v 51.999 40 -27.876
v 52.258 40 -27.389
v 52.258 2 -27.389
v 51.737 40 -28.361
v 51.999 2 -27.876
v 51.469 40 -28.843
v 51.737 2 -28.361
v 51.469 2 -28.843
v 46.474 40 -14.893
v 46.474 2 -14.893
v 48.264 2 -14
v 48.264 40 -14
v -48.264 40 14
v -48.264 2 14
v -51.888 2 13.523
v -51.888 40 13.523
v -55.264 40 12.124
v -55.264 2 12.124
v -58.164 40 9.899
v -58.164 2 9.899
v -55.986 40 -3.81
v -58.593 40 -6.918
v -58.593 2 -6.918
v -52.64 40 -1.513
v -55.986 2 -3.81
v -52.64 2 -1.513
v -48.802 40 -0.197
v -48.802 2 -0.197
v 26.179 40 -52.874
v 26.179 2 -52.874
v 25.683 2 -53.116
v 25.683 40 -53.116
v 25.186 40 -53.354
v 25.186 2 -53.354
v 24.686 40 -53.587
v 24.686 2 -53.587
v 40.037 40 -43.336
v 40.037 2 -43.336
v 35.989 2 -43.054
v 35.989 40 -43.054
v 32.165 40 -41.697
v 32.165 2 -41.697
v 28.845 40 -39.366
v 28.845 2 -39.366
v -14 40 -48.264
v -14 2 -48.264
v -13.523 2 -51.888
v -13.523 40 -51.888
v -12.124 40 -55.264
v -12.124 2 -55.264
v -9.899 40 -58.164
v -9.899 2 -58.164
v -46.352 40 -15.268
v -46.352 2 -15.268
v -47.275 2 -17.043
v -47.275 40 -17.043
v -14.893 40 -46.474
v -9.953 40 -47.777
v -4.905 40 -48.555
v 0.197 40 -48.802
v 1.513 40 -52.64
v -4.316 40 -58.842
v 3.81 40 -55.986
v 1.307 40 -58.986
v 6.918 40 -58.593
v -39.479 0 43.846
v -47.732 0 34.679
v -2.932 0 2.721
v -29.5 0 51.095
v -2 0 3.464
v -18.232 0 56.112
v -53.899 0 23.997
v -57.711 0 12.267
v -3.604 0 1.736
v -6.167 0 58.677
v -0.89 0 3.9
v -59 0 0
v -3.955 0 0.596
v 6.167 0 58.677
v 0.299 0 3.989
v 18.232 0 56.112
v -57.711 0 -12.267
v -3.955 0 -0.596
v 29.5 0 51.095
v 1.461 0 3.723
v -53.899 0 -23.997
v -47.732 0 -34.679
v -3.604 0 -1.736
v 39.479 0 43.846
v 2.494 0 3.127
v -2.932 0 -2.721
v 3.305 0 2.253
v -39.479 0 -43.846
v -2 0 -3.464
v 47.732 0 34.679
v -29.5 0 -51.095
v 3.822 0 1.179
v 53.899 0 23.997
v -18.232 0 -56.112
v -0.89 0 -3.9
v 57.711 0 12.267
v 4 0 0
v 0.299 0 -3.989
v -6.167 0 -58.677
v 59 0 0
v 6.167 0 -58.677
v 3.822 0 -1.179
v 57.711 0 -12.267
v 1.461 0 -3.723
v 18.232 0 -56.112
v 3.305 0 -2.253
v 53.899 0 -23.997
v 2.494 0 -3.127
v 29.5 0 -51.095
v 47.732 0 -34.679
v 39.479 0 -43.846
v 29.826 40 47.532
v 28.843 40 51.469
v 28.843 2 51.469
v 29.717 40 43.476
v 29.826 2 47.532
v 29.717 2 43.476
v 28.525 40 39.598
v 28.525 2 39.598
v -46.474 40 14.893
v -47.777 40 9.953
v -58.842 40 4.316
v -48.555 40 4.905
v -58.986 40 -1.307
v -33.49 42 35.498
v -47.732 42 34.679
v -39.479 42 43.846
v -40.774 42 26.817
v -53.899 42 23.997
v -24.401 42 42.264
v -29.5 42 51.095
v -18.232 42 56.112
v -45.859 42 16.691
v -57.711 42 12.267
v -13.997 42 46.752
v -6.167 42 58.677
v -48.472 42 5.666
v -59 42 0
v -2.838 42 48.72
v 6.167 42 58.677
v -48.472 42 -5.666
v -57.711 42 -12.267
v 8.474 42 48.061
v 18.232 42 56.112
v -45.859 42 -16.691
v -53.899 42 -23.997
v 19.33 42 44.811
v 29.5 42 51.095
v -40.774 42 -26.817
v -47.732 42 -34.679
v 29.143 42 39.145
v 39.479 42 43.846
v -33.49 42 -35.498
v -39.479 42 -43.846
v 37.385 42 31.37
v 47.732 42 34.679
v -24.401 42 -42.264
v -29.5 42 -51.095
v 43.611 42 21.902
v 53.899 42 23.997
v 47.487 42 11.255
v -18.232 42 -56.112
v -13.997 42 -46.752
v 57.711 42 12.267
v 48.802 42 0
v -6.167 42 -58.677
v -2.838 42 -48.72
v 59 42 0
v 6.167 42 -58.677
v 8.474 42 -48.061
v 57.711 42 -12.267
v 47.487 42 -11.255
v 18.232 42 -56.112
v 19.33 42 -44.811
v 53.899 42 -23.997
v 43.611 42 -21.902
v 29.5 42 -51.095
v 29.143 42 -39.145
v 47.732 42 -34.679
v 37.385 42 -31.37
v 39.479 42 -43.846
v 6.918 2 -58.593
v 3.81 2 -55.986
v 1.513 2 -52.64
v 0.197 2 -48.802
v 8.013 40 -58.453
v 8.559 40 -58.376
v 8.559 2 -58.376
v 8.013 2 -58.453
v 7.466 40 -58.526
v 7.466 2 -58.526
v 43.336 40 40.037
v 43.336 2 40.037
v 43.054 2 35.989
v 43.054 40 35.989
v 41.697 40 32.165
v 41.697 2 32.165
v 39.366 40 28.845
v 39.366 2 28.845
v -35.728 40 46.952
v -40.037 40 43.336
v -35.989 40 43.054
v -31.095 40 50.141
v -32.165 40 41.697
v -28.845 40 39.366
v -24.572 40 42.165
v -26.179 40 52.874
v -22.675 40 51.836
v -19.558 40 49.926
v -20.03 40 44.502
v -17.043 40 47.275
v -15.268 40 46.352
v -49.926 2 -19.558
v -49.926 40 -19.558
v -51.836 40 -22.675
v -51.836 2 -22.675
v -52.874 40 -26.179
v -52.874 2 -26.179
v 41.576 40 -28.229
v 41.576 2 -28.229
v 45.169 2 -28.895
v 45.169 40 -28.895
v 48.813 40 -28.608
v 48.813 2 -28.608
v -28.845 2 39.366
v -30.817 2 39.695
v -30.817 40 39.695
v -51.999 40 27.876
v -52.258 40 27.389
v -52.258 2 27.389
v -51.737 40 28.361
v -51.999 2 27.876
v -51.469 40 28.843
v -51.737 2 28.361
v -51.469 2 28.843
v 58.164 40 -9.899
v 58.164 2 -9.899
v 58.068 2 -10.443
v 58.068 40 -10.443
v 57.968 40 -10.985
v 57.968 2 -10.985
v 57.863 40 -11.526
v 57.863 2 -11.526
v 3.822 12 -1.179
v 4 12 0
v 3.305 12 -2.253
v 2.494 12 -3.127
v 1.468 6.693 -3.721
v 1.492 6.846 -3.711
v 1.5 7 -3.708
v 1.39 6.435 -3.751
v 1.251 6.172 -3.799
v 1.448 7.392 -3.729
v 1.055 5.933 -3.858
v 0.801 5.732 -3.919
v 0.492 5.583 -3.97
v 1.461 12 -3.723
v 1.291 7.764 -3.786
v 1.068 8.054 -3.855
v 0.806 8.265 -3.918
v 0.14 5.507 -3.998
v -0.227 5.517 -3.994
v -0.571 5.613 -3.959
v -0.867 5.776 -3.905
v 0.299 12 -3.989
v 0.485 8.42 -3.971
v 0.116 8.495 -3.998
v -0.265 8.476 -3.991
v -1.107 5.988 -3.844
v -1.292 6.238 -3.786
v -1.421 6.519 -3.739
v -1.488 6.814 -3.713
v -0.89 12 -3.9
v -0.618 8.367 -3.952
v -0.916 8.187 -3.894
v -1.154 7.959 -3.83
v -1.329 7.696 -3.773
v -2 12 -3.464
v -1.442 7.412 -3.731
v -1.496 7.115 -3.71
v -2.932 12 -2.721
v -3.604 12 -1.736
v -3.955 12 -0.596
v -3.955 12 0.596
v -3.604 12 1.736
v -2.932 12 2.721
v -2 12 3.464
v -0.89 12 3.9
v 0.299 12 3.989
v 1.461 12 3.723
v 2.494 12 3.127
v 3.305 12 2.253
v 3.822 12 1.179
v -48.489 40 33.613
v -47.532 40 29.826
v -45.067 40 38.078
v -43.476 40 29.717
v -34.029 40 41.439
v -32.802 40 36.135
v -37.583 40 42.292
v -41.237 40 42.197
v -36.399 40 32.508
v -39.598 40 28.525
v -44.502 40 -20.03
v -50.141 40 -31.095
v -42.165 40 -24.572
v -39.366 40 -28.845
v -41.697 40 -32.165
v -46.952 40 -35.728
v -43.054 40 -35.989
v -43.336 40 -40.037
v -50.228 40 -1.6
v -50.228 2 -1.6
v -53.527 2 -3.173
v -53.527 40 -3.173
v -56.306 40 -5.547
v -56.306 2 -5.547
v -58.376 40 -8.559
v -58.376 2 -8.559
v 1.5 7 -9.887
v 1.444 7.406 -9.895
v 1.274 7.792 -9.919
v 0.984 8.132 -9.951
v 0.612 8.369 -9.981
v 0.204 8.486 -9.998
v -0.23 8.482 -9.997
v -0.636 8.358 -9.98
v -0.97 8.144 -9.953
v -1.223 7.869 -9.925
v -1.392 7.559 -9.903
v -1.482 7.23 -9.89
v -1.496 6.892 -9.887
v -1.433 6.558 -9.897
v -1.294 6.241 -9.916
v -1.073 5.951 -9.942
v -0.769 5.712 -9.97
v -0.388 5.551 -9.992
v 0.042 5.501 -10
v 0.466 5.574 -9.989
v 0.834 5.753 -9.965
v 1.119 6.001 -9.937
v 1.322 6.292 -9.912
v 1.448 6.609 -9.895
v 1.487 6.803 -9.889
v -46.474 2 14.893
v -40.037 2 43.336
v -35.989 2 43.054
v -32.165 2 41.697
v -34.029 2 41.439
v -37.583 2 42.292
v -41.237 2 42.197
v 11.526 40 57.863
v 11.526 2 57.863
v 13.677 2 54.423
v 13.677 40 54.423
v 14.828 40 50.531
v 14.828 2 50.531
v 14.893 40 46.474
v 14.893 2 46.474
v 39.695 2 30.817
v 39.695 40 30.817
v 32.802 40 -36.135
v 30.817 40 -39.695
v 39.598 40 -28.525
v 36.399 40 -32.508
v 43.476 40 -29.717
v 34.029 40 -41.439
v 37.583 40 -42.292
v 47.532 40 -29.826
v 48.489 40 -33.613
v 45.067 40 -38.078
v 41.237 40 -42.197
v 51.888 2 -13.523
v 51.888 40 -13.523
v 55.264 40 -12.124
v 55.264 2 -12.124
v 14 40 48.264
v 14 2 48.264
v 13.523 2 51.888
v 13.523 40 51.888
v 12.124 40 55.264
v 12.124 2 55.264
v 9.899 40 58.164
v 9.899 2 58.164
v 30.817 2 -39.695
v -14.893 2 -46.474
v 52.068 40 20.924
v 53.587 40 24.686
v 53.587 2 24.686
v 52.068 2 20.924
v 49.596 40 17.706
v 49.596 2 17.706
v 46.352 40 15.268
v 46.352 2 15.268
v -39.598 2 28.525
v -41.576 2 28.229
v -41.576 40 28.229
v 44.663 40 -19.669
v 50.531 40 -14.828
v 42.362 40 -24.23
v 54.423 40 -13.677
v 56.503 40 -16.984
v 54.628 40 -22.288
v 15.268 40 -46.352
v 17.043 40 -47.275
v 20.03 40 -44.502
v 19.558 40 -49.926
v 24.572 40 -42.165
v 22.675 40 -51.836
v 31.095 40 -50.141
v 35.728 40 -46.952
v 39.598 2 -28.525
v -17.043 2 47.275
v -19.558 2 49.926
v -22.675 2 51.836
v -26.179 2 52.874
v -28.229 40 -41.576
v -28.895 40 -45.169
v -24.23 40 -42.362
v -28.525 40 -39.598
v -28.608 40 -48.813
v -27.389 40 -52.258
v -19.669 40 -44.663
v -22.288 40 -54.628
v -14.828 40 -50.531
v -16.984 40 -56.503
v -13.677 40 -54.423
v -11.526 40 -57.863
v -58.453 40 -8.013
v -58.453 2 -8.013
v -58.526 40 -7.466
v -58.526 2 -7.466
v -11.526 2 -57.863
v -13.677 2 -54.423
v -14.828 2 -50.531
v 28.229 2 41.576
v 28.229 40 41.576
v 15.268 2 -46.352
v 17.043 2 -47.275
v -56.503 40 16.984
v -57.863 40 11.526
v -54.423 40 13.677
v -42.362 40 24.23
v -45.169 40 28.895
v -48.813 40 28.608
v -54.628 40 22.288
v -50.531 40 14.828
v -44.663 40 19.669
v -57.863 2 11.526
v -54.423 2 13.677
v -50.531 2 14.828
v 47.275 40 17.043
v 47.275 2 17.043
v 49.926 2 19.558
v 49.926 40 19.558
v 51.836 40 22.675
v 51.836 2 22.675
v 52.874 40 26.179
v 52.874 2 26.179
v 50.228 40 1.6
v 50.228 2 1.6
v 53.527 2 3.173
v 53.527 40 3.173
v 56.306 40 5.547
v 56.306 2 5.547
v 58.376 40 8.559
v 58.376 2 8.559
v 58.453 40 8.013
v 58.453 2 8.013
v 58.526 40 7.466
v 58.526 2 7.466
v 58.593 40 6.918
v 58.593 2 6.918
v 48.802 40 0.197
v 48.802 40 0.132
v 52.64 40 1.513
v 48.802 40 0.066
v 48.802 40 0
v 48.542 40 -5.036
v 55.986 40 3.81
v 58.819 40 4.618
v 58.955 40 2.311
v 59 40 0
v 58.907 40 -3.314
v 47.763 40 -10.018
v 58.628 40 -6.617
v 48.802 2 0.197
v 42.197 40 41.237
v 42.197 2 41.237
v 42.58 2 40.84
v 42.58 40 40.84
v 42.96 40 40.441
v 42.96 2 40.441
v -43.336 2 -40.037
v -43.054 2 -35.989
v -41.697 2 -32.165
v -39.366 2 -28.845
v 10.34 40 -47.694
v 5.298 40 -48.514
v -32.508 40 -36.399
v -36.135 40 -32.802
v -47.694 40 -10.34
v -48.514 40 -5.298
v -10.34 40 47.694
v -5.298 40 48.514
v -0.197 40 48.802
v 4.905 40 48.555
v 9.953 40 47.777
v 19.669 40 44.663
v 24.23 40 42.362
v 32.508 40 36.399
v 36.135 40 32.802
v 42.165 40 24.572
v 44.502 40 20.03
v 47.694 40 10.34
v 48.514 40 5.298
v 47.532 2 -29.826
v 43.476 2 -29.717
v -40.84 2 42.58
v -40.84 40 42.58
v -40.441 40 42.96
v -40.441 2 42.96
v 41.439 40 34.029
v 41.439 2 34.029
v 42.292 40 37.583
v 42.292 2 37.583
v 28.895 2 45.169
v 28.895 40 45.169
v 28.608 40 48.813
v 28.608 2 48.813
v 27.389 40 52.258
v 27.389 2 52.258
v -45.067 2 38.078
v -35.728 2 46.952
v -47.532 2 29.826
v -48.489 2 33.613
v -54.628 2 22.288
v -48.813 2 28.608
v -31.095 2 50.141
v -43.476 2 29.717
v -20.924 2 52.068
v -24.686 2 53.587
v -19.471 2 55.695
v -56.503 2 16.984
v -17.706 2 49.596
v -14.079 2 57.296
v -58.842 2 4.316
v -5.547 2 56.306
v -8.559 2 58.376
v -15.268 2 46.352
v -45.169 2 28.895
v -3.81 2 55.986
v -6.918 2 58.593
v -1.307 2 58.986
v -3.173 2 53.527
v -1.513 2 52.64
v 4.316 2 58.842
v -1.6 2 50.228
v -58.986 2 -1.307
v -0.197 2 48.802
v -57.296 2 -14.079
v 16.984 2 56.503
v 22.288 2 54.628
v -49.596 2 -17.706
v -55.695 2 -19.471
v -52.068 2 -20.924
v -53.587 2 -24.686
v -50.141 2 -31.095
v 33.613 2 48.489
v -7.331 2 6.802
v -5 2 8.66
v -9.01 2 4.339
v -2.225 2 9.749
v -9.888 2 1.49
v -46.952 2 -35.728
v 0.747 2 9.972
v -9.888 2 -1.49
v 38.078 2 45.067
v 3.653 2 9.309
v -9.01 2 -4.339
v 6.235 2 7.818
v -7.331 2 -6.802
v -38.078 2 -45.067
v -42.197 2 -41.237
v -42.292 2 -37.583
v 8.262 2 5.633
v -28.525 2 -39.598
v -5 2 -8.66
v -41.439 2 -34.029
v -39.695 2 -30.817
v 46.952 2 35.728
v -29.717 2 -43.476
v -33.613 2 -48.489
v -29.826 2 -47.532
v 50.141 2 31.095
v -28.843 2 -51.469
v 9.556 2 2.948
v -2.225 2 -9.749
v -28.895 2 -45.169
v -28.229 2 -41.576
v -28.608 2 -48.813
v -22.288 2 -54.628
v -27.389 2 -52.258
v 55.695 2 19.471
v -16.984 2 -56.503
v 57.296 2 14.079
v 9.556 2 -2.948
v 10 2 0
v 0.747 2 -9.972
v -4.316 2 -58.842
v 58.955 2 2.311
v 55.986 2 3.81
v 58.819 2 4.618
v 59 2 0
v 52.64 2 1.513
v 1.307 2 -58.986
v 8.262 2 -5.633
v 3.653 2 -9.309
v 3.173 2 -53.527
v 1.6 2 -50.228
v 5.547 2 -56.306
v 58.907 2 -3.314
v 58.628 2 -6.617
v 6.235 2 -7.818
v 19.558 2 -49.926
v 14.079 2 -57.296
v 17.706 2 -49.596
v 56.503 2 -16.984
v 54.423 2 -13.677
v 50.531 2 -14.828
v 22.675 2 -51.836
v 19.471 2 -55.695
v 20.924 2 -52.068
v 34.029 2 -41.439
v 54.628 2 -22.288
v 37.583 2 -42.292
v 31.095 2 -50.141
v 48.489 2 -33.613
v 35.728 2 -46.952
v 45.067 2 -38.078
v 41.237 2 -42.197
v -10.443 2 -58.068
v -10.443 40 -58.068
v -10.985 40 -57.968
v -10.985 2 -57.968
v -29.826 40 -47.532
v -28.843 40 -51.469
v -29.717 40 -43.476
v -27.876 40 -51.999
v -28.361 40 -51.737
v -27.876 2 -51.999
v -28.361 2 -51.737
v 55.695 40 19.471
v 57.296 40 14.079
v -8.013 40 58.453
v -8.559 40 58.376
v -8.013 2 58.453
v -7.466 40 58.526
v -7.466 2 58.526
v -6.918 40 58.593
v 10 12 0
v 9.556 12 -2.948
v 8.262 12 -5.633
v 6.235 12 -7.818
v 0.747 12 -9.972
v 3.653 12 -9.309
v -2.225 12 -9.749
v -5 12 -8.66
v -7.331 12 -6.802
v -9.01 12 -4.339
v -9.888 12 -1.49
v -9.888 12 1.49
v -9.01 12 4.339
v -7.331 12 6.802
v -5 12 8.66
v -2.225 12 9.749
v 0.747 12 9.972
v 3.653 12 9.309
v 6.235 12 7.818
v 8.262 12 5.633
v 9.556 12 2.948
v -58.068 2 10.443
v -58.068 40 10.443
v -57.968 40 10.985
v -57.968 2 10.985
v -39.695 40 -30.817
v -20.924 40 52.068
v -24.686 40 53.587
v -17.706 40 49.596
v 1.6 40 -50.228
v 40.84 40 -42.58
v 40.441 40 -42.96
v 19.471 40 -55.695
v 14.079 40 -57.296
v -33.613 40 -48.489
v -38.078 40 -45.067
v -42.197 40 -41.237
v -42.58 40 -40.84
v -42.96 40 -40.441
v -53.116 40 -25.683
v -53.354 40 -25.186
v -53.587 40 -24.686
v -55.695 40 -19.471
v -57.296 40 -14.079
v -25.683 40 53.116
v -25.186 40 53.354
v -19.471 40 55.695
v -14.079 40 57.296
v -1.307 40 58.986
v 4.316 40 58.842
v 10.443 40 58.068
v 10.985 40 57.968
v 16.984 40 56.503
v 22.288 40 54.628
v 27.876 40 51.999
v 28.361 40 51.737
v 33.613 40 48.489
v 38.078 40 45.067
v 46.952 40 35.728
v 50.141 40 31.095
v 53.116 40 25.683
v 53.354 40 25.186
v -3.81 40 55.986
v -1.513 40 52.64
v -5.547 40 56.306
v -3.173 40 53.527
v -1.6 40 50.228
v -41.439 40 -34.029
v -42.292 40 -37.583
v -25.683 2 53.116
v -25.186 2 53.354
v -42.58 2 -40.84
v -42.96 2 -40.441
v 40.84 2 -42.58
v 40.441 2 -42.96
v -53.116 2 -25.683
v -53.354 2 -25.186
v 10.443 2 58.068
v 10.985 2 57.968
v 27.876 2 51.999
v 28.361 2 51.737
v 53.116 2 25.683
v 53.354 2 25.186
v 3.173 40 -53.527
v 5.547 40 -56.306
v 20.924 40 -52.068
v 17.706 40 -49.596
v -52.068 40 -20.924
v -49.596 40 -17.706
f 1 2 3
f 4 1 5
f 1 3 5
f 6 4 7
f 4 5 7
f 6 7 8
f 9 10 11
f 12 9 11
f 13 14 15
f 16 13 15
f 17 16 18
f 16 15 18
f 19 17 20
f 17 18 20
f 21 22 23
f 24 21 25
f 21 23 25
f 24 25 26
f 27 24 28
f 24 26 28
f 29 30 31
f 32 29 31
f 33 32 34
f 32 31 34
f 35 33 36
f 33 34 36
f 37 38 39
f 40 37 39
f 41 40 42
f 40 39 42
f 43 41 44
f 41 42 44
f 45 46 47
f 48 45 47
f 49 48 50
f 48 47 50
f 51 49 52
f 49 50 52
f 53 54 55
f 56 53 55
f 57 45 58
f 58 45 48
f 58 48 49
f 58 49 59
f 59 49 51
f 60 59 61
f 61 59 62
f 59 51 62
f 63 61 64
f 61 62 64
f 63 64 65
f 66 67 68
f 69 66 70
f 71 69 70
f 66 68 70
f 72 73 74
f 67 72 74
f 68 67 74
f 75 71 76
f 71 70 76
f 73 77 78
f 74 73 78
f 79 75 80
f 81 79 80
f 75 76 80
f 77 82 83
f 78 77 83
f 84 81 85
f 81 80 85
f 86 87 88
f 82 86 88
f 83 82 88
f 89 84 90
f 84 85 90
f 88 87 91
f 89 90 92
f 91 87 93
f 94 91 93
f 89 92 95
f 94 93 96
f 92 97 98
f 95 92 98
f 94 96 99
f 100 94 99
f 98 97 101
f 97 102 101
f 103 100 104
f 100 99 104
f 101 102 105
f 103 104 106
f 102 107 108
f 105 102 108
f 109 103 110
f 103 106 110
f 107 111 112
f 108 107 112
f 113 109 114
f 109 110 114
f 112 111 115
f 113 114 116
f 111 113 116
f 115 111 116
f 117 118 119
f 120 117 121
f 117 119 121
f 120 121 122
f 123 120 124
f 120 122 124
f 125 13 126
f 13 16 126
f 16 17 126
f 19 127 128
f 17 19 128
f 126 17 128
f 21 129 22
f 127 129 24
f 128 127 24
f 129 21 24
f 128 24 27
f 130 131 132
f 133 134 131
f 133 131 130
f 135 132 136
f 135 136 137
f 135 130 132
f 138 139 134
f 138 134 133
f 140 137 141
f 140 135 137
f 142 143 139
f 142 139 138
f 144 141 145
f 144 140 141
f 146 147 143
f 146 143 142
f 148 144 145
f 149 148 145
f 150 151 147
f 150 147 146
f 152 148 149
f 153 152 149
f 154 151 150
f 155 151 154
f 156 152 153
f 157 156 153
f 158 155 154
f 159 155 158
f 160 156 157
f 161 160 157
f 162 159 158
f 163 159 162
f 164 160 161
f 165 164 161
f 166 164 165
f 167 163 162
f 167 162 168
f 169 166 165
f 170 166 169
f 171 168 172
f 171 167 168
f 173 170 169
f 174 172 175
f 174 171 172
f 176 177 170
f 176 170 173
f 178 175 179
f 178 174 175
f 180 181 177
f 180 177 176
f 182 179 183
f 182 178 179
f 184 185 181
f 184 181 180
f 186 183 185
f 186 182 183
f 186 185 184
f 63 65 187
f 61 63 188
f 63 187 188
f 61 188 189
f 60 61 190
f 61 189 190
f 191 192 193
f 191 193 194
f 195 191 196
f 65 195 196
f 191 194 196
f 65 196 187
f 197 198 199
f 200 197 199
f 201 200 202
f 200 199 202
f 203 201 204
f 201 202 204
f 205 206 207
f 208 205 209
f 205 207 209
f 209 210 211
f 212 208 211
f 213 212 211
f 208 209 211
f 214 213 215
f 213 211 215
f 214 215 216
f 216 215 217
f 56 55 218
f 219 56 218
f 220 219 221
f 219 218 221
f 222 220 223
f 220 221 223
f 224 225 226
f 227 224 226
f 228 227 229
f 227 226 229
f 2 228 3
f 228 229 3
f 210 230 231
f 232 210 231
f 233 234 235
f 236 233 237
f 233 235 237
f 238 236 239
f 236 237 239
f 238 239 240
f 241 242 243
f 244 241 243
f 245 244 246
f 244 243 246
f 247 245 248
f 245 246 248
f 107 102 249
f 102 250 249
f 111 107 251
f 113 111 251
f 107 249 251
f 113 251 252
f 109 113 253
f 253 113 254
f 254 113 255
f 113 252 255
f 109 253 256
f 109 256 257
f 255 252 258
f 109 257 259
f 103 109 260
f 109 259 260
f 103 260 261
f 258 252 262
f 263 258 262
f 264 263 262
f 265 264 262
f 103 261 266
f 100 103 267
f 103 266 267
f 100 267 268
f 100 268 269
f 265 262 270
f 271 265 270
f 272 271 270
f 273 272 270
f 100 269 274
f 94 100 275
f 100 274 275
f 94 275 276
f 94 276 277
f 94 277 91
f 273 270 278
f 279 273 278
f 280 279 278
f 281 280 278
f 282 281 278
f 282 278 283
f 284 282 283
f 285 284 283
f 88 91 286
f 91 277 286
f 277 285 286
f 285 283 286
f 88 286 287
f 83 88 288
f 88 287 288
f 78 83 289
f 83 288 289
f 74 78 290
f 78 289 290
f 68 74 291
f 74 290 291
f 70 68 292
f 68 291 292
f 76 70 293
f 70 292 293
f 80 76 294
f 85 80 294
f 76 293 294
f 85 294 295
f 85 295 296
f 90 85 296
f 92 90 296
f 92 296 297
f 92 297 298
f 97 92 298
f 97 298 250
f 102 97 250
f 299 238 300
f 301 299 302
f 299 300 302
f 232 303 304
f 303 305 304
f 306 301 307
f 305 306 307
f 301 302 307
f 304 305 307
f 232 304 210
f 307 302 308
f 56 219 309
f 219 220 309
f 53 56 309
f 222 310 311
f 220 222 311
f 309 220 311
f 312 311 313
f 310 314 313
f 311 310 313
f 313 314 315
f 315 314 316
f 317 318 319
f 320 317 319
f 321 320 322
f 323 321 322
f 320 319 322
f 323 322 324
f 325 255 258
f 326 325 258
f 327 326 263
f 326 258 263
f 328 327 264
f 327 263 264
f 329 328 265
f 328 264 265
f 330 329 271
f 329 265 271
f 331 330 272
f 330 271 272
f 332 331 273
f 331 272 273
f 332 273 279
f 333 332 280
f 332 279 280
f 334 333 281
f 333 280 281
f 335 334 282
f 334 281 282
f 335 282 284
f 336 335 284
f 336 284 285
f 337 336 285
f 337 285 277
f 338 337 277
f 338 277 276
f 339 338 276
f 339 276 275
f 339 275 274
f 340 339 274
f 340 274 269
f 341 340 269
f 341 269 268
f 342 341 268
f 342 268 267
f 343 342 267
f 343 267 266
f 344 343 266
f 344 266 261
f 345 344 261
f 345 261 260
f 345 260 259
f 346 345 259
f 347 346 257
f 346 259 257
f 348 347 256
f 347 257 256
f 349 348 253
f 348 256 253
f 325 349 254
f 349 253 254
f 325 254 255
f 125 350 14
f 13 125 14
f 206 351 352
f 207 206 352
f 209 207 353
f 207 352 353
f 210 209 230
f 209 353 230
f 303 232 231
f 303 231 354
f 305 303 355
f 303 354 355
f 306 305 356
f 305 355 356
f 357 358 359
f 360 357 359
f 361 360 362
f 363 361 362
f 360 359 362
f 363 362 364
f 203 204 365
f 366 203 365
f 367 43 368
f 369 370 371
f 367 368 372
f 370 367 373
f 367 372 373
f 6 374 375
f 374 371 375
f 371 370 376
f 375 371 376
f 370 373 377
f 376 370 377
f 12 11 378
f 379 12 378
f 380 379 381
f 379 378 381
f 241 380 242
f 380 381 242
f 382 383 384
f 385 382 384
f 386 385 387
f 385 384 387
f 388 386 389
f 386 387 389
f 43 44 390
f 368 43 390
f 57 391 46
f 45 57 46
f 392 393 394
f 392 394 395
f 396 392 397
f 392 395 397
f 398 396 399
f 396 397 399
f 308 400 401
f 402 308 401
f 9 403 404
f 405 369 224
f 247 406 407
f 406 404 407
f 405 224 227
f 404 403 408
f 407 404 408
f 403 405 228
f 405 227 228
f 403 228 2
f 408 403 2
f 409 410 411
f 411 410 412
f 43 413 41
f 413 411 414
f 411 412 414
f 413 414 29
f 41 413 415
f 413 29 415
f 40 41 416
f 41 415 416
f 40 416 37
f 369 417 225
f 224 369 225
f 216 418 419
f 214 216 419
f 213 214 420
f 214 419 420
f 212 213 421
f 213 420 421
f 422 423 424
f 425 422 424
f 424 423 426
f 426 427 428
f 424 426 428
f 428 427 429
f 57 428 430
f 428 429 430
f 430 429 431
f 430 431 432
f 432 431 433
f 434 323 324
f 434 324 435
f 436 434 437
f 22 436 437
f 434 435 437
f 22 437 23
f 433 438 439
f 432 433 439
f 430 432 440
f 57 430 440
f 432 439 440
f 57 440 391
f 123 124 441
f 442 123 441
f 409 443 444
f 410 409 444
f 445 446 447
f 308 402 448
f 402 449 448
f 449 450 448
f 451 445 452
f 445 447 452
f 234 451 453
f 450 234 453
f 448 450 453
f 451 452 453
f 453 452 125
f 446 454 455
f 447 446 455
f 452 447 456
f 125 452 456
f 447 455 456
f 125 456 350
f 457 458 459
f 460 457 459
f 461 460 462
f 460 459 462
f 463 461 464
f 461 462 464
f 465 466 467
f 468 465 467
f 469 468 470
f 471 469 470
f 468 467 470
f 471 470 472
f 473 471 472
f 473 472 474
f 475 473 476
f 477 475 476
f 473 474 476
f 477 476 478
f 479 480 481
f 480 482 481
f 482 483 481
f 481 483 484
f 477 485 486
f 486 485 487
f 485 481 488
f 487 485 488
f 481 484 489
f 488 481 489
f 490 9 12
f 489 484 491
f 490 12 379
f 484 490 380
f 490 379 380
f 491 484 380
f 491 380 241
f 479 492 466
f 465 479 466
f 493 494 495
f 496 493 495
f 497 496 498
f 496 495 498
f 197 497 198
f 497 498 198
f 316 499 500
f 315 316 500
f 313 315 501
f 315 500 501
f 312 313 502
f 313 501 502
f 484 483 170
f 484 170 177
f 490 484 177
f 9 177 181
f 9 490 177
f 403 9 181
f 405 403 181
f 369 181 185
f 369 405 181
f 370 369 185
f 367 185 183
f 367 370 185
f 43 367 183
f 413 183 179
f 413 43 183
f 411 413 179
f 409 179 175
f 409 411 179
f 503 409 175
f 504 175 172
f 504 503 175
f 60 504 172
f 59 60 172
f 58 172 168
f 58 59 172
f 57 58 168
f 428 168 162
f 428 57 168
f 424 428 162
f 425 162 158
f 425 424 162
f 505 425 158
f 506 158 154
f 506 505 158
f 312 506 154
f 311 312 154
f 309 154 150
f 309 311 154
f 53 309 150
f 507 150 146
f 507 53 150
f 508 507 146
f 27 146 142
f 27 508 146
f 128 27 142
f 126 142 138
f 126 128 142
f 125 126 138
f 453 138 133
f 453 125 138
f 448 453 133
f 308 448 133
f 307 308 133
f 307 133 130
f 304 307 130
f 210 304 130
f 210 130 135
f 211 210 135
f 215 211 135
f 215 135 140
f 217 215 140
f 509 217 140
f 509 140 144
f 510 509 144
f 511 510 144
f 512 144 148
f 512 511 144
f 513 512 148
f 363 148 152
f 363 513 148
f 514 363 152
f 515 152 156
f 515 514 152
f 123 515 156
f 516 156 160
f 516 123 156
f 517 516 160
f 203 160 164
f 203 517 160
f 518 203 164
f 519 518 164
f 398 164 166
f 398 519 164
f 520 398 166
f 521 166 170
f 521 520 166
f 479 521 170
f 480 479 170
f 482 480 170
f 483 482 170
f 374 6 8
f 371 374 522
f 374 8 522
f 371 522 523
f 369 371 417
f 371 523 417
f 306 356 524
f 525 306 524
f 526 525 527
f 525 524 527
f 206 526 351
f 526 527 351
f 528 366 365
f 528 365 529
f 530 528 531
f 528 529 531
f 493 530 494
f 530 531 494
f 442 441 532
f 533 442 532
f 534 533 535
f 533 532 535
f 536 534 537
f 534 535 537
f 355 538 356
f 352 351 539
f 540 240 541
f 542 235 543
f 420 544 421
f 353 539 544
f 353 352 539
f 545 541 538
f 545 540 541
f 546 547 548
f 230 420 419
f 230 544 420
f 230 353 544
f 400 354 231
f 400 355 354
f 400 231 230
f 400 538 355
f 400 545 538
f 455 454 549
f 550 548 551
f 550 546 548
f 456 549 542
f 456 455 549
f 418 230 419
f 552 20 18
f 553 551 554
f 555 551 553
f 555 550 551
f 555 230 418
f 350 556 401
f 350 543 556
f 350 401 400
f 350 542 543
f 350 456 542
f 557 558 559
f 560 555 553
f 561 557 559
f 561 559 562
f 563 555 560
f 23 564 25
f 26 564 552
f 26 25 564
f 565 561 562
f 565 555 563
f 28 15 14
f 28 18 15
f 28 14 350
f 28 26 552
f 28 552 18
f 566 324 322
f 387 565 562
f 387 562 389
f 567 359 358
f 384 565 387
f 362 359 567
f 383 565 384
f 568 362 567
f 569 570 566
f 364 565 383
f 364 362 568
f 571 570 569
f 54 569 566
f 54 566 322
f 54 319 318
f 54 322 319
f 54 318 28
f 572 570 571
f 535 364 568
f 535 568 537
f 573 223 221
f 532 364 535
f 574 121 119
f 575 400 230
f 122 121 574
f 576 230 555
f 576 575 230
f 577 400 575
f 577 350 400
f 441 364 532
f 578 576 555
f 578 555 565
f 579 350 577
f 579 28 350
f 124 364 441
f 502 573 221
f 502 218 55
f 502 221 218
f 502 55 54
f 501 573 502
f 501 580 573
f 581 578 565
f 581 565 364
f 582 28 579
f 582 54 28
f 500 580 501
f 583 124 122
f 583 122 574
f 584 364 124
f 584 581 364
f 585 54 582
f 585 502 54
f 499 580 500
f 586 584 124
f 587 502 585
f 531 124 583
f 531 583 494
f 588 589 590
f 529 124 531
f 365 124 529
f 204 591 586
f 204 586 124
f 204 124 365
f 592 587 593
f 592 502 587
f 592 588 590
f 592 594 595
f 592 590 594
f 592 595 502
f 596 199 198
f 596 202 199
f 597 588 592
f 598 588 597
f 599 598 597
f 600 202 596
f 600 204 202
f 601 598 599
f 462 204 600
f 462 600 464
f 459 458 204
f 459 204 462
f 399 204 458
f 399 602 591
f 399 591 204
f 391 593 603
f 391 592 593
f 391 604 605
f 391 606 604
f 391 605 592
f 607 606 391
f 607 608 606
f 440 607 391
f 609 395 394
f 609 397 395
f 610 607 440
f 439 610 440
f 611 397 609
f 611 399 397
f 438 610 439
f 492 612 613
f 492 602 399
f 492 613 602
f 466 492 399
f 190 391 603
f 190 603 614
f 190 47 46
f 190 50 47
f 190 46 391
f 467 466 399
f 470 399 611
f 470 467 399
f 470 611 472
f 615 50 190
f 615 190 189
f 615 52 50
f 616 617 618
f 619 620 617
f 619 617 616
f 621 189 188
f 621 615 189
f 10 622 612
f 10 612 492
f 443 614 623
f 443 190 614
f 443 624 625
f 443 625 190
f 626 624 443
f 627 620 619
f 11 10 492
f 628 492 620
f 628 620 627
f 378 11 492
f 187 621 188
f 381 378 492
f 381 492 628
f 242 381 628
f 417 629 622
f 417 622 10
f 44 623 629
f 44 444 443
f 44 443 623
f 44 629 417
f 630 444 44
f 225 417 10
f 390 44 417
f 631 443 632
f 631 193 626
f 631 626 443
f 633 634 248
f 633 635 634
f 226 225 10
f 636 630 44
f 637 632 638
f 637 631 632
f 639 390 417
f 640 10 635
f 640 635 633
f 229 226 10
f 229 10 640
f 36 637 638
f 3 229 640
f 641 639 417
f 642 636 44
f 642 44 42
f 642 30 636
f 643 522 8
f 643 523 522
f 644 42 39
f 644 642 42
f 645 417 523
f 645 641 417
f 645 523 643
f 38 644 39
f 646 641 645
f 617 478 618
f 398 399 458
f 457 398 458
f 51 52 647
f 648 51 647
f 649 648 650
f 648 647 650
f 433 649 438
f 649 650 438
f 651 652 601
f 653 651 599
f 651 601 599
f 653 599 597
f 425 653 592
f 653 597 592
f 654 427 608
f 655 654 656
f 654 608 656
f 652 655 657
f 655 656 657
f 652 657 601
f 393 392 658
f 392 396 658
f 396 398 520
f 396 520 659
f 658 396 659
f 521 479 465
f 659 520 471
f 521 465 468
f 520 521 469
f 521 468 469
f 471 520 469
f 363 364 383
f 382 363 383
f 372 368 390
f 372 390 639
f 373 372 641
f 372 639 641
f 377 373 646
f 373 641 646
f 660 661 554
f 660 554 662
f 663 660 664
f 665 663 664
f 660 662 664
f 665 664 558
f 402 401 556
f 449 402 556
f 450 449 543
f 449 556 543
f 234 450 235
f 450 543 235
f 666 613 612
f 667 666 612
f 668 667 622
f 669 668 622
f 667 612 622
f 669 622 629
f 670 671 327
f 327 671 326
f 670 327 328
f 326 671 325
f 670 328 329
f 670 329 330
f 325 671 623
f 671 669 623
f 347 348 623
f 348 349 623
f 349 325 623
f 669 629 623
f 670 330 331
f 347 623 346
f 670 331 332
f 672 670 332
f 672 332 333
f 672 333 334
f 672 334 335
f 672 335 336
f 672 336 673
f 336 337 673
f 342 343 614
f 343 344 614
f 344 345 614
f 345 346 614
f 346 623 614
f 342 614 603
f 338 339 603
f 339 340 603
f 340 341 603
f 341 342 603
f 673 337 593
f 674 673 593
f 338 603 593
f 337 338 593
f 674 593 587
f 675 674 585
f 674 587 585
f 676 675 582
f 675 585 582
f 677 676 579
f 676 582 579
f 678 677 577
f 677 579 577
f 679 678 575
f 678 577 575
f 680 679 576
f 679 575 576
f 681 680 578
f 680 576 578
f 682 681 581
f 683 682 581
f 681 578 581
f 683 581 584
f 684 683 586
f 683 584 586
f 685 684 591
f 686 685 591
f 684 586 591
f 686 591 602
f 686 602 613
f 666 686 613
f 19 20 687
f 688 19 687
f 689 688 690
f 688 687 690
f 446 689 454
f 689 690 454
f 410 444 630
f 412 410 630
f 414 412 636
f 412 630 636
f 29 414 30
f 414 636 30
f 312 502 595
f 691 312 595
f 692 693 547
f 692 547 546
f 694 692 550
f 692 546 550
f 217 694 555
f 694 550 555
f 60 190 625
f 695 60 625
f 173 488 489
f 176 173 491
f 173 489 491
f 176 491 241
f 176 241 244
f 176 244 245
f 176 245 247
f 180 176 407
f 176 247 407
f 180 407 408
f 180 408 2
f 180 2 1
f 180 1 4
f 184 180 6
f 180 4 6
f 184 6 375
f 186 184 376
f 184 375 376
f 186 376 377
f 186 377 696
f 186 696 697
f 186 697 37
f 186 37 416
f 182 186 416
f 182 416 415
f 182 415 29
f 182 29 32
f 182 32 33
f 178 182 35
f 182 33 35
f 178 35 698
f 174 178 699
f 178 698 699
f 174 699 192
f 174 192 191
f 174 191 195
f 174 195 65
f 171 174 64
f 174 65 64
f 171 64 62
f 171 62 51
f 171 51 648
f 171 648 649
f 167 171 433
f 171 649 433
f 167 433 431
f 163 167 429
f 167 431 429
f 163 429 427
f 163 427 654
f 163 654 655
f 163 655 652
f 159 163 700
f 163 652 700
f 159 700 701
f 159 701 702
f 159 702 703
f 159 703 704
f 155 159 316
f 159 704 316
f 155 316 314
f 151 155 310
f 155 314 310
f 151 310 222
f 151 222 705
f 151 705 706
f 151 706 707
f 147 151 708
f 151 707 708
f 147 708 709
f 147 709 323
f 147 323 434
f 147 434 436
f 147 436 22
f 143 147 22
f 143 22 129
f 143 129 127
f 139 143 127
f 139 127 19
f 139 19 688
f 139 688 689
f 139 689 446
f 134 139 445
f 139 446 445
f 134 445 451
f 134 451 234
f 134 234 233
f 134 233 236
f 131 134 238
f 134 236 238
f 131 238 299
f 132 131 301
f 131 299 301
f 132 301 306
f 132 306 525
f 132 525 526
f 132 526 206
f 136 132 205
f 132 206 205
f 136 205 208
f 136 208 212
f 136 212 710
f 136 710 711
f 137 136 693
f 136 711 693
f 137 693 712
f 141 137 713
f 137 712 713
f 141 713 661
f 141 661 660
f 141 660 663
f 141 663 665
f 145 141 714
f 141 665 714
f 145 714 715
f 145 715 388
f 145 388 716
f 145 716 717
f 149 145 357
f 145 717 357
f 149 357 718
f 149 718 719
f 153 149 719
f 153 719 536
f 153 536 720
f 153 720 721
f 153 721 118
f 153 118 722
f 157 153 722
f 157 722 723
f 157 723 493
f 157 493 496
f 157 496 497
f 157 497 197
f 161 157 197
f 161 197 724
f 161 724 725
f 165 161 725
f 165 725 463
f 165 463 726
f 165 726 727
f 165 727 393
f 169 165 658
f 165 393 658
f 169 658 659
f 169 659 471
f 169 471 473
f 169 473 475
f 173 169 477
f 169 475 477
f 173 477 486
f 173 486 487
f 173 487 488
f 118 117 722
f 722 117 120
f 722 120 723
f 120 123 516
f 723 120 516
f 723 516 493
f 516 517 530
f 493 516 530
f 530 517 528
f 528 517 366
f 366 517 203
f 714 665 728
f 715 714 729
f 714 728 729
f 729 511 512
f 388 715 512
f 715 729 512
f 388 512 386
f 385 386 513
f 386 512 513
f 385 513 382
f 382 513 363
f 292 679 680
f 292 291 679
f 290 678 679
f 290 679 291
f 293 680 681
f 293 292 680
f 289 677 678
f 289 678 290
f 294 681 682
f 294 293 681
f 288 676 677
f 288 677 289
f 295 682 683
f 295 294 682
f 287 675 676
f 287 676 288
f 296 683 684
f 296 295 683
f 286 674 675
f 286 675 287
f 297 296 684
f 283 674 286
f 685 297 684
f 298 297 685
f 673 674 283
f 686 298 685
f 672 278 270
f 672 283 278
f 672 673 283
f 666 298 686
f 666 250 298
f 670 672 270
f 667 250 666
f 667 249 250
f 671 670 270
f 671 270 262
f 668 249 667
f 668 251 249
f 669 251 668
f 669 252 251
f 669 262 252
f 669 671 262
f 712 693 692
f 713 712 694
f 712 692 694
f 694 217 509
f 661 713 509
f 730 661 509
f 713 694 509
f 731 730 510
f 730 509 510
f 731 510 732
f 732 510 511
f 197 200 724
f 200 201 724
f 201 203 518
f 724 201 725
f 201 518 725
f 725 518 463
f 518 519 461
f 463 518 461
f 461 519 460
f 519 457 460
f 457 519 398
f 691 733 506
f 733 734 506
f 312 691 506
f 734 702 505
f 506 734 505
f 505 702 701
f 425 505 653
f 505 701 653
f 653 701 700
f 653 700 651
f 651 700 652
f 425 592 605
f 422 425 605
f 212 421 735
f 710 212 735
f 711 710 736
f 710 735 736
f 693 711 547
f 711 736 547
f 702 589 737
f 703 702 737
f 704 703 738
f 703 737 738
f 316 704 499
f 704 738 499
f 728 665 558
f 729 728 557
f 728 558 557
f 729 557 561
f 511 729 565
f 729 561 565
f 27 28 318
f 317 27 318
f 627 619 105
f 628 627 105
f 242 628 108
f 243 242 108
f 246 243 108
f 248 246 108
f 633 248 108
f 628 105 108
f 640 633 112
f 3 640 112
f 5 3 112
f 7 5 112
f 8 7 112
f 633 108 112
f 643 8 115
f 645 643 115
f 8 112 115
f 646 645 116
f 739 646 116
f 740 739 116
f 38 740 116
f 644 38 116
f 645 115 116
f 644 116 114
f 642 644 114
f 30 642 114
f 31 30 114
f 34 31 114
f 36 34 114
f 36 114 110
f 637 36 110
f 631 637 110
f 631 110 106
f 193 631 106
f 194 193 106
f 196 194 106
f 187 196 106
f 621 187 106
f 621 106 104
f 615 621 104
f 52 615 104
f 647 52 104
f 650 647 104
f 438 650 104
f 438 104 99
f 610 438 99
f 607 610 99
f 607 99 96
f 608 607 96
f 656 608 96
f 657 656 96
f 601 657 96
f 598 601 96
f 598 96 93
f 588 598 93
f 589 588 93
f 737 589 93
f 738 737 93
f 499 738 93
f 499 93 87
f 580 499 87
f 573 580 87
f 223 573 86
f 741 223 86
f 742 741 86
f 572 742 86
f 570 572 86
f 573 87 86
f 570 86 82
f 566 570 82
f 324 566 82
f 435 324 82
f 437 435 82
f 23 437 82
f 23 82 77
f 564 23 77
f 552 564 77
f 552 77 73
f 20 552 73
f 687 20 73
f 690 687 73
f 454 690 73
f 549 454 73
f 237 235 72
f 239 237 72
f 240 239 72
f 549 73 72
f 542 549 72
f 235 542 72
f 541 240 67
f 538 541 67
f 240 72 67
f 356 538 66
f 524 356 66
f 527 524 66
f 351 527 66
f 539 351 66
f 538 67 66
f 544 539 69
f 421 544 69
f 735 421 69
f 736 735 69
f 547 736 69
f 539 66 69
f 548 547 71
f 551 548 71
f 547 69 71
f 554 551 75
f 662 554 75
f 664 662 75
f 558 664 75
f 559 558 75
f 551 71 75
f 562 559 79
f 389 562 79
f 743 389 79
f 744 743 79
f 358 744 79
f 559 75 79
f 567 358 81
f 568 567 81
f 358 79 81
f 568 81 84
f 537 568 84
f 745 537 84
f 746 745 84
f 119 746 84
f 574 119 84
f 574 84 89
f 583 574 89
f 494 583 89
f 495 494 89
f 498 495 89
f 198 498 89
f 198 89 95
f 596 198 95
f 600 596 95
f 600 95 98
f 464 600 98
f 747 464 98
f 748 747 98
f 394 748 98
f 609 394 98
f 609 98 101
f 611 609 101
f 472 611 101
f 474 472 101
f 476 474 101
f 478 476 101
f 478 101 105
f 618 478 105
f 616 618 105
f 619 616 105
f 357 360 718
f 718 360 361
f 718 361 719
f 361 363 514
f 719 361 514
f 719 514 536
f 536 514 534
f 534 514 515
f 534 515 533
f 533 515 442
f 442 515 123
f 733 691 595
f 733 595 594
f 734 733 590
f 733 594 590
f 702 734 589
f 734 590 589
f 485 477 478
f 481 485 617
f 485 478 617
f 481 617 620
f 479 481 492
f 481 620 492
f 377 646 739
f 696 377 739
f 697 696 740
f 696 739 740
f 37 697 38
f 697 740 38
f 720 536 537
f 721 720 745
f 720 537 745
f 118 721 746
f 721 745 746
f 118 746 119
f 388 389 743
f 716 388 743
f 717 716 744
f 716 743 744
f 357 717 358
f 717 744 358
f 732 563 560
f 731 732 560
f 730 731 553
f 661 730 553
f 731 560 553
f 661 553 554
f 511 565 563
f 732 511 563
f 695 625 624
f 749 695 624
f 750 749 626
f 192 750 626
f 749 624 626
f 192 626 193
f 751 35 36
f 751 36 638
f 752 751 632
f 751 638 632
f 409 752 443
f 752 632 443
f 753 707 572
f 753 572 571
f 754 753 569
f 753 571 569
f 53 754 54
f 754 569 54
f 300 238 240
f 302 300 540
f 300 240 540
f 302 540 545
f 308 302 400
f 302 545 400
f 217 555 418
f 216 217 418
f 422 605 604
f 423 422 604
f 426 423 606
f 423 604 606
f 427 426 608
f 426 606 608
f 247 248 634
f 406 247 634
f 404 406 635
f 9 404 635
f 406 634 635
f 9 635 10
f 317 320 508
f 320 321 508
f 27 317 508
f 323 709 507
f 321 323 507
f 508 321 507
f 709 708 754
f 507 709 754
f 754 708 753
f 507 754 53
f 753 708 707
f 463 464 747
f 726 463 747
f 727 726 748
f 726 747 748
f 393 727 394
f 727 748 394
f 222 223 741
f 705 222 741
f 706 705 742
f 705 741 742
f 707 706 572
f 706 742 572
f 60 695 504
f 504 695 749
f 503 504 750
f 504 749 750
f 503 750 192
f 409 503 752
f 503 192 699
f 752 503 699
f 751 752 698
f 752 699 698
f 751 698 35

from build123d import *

# Parameters (mm, degrees)
SKETCH2_R           = 59
BOSS_EXTRUDE1_DEPTH = 2
BOSS_EXTRUDE2_DEPTH = 38
SKETCH4_R           = 59
SKETCH4_R_2         = 48.802353881
BOSS_EXTRUDE3_DEPTH = 2
SKETCH5_R           = 10
SKETCH5_R_2         = 4
BOSS_EXTRUDE4_DEPTH = 10
SKETCH6_R           = 1.5
CUT_EXTRUDE1_DEPTH  = 25
SKETCH7_R           = 4
CUT_EXTRUDE2_DEPTH  = 3


with BuildPart() as part:
    # Sketch2 → Boss-Extrude1 (new body)
    with BuildSketch(Plane(origin=(0, 0, 0), x_dir=(1, 0, 0), z_dir=(0, 1, 0))):
        Circle(SKETCH2_R)
    extrude(amount=BOSS_EXTRUDE1_DEPTH)

    # Sketch3 → Boss-Extrude2 (add)
    with BuildSketch(Plane(origin=(0, 2, 0), x_dir=(1, 0, 0), z_dir=(0, 1, 0))):
        with BuildLine():
            Line((-14.892857143, 46.474428995), (-14, 48.26406754))
            ThreePointArc((-14, 48.26406754), (-12.934313455, 53.621635593), (-9.899494937, 58.163562477))
            ThreePointArc((-9.899494937, 58.163562477), (-10.714001991, 58.019049986), (-11.526402854, 57.863131934))
            ThreePointArc((-11.526402854, 57.863131934), (-14.384712835, 52.516130174), (-14.892857143, 46.474428995))
        make_face()
        with BuildLine():
            Line((0.197439531, 48.801954489), (1.599625859, 50.228093858))
            ThreePointArc((1.599625859, 50.228093858), (4.268733569, 54.994128614), (8.558550091, 58.375947276))
            ThreePointArc((8.558550091, 58.375947276), (7.739251034, 58.490204252), (6.918430571, 58.592963045))
            ThreePointArc((6.918430571, 58.592963045), (2.547701825, 54.390928538), (0.197439531, 48.801954489))
        make_face()
        with BuildLine():
            Line((15.268409449, 46.352404654), (17.042669195, 47.27544439))
            ThreePointArc((17.042669195, 47.27544439), (21.05392721, 50.983413159), (26.178824605, 52.874087626))
            ThreePointArc((26.178824605, 52.874087626), (25.434932246, 53.2359298), (24.686039809, 53.587306692))
            ThreePointArc((24.686039809, 53.587306692), (19.230729681, 50.941563853), (15.268409449, 46.352404654))
        make_face()
        with BuildLine():
            Line((28.844801068, 39.365558495), (30.817457326, 39.695145037))
            ThreePointArc((30.817457326, 39.695145037), (35.778215764, 41.982086001), (41.236533368, 42.196543884))
            ThreePointArc((41.236533368, 42.196543884), (40.640865073, 42.770551623), (40.037207473, 43.336151396))
            ThreePointArc((40.037207473, 43.336151396), (34.031319726, 42.505683967), (28.844801068, 39.365558495))
        make_face()
        with BuildLine():
            Line((39.597662585, 28.525337195), (41.575618016, 28.229208316))
            ThreePointArc((41.575618016, 28.229208316), (47.000283277, 28.87125976), (52.257722933, 27.388508426))
            ThreePointArc((52.257722933, 27.388508426), (51.868586866, 28.118493853), (51.469254313, 28.842951659))
            ThreePointArc((51.469254313, 28.842951659), (45.500687087, 29.90905158), (39.597662585, 28.525337195))
        make_face()
        with BuildLine():
            Line((46.474428995, 14.892857143), (48.26406754, 14))
            ThreePointArc((48.26406754, 14), (53.621635593, 12.934313455), (58.163562477, 9.899494937))
            ThreePointArc((58.163562477, 9.899494937), (58.019049986, 10.714001991), (57.863131934, 11.526402854))
            ThreePointArc((57.863131934, 11.526402854), (52.516130174, 14.384712835), (46.474428995, 14.892857143))
        make_face()
        with BuildLine():
            Line((48.801954489, -0.197439531), (50.228093858, -1.599625859))
            ThreePointArc((50.228093858, -1.599625859), (54.994128614, -4.268733569), (58.375947276, -8.558550091))
            ThreePointArc((58.375947276, -8.558550091), (58.490204252, -7.739251034), (58.592963045, -6.918430571))
            ThreePointArc((58.592963045, -6.918430571), (54.390928538, -2.547701825), (48.801954489, -0.197439531))
        make_face()
        with BuildLine():
            Line((46.352404654, -15.268409449), (47.27544439, -17.042669195))
            ThreePointArc((47.27544439, -17.042669195), (50.983413159, -21.05392721), (52.874087626, -26.178824605))
            ThreePointArc((52.874087626, -26.178824605), (53.2359298, -25.434932246), (53.587306692, -24.686039809))
            ThreePointArc((53.587306692, -24.686039809), (50.941563853, -19.230729681), (46.352404654, -15.268409449))
        make_face()
        with BuildLine():
            Line((39.365558495, -28.844801068), (39.695145037, -30.817457326))
            ThreePointArc((39.695145037, -30.817457326), (41.982086001, -35.778215764), (42.196543884, -41.236533368))
            ThreePointArc((42.196543884, -41.236533368), (42.770551623, -40.640865073), (43.336151396, -40.037207473))
            ThreePointArc((43.336151396, -40.037207473), (42.505683967, -34.031319726), (39.365558495, -28.844801068))
        make_face()
        with BuildLine():
            Line((28.525337195, -39.597662585), (28.229208316, -41.575618016))
            ThreePointArc((28.229208316, -41.575618016), (28.87125976, -47.000283277), (27.388508426, -52.257722933))
            ThreePointArc((27.388508426, -52.257722933), (28.118493853, -51.868586866), (28.842951659, -51.469254313))
            ThreePointArc((28.842951659, -51.469254313), (29.90905158, -45.500687087), (28.525337195, -39.597662585))
        make_face()
        with BuildLine():
            Line((14.892857143, -46.474428995), (14, -48.26406754))
            ThreePointArc((14, -48.26406754), (12.934313455, -53.621635593), (9.899494937, -58.163562477))
            ThreePointArc((9.899494937, -58.163562477), (10.714001991, -58.019049986), (11.526402854, -57.863131934))
            ThreePointArc((11.526402854, -57.863131934), (14.384712835, -52.516130174), (14.892857143, -46.474428995))
        make_face()
        with BuildLine():
            Line((-0.197439531, -48.801954489), (-1.599625859, -50.228093858))
            ThreePointArc((-1.599625859, -50.228093858), (-4.268733569, -54.994128614), (-8.558550091, -58.375947276))
            ThreePointArc((-8.558550091, -58.375947276), (-7.739251034, -58.490204252), (-6.918430571, -58.592963045))
            ThreePointArc((-6.918430571, -58.592963045), (-2.547701825, -54.390928538), (-0.197439531, -48.801954489))
        make_face()
        with BuildLine():
            Line((-15.268409449, -46.352404654), (-17.042669195, -47.27544439))
            ThreePointArc((-17.042669195, -47.27544439), (-21.05392721, -50.983413159), (-26.178824605, -52.874087626))
            ThreePointArc((-26.178824605, -52.874087626), (-25.434932246, -53.2359298), (-24.686039809, -53.587306692))
            ThreePointArc((-24.686039809, -53.587306692), (-19.230729681, -50.941563853), (-15.268409449, -46.352404654))
        make_face()
        with BuildLine():
            Line((-28.844801068, -39.365558495), (-30.817457326, -39.695145037))
            ThreePointArc((-30.817457326, -39.695145037), (-35.778215764, -41.982086001), (-41.236533368, -42.196543884))
            ThreePointArc((-41.236533368, -42.196543884), (-40.640865073, -42.770551623), (-40.037207473, -43.336151396))
            ThreePointArc((-40.037207473, -43.336151396), (-34.031319726, -42.505683967), (-28.844801068, -39.365558495))
        make_face()
        with BuildLine():
            Line((-39.597662585, -28.525337195), (-41.575618016, -28.229208316))
            ThreePointArc((-41.575618016, -28.229208316), (-47.000283277, -28.87125976), (-52.257722933, -27.388508426))
            ThreePointArc((-52.257722933, -27.388508426), (-51.868586866, -28.118493853), (-51.469254313, -28.842951659))
            ThreePointArc((-51.469254313, -28.842951659), (-45.500687087, -29.90905158), (-39.597662585, -28.525337195))
        make_face()
        with BuildLine():
            Line((-46.474428995, -14.892857143), (-48.26406754, -14))
            ThreePointArc((-48.26406754, -14), (-53.621635593, -12.934313455), (-58.163562477, -9.899494937))
            ThreePointArc((-58.163562477, -9.899494937), (-58.019049986, -10.714001991), (-57.863131934, -11.526402854))
            ThreePointArc((-57.863131934, -11.526402854), (-52.516130174, -14.384712835), (-46.474428995, -14.892857143))
        make_face()
        with BuildLine():
            Line((-48.801954489, 0.197439531), (-50.228093858, 1.599625859))
            ThreePointArc((-50.228093858, 1.599625859), (-54.994128614, 4.268733569), (-58.375947276, 8.558550091))
            ThreePointArc((-58.375947276, 8.558550091), (-58.490204252, 7.739251034), (-58.592963045, 6.918430571))
            ThreePointArc((-58.592963045, 6.918430571), (-54.390928538, 2.547701825), (-48.801954489, 0.197439531))
        make_face()
        with BuildLine():
            Line((-46.352404654, 15.268409449), (-47.27544439, 17.042669195))
            ThreePointArc((-47.27544439, 17.042669195), (-50.983413159, 21.05392721), (-52.874087626, 26.178824605))
            ThreePointArc((-52.874087626, 26.178824605), (-53.2359298, 25.434932246), (-53.587306692, 24.686039809))
            ThreePointArc((-53.587306692, 24.686039809), (-50.941563853, 19.230729681), (-46.352404654, 15.268409449))
        make_face()
        with BuildLine():
            Line((-39.365558495, 28.844801068), (-39.695145037, 30.817457326))
            ThreePointArc((-39.695145037, 30.817457326), (-41.982086001, 35.778215764), (-42.196543884, 41.236533368))
            ThreePointArc((-42.196543884, 41.236533368), (-42.770551623, 40.640865073), (-43.336151396, 40.037207473))
            ThreePointArc((-43.336151396, 40.037207473), (-42.505683967, 34.031319726), (-39.365558495, 28.844801068))
        make_face()
        with BuildLine():
            Line((-28.525337195, 39.597662585), (-28.229208316, 41.575618016))
            ThreePointArc((-28.229208316, 41.575618016), (-28.87125976, 47.000283277), (-27.388508426, 52.257722933))
            ThreePointArc((-27.388508426, 52.257722933), (-28.118493853, 51.868586866), (-28.842951659, 51.469254313))
            ThreePointArc((-28.842951659, 51.469254313), (-29.90905158, 45.500687087), (-28.525337195, 39.597662585))
        make_face()
    extrude(amount=BOSS_EXTRUDE2_DEPTH)

    # Sketch4 → Boss-Extrude3 (add)
    with BuildSketch(Plane(origin=(0, 40, 0), x_dir=(1, 0, 0), z_dir=(0, 1, 0))):
        Circle(SKETCH4_R)
        Circle(SKETCH4_R_2, mode=Mode.SUBTRACT)
    extrude(amount=BOSS_EXTRUDE3_DEPTH)

    # Sketch5 → Boss-Extrude4 (add)
    with BuildSketch(Plane(origin=(0, 2, 0), x_dir=(1, 0, 0), z_dir=(0, 1, 0))):
        Circle(SKETCH5_R)
        Circle(SKETCH5_R_2, mode=Mode.SUBTRACT)
    extrude(amount=BOSS_EXTRUDE4_DEPTH)

    # Sketch6 → Cut-Extrude1 (cut)
    with BuildSketch(Plane.XY):
        with Locations((0, 7)):
            Circle(SKETCH6_R)
    extrude(amount=-CUT_EXTRUDE1_DEPTH, mode=Mode.SUBTRACT)

    # Sketch7 → Cut-Extrude2 (cut, through all)
    with BuildSketch(Plane(origin=(0, 2, 0), x_dir=(1, 0, 0), z_dir=(0, 1, 0))):
        Circle(SKETCH7_R)
    extrude(amount=-CUT_EXTRUDE2_DEPTH, mode=Mode.SUBTRACT)


solid = part.part
